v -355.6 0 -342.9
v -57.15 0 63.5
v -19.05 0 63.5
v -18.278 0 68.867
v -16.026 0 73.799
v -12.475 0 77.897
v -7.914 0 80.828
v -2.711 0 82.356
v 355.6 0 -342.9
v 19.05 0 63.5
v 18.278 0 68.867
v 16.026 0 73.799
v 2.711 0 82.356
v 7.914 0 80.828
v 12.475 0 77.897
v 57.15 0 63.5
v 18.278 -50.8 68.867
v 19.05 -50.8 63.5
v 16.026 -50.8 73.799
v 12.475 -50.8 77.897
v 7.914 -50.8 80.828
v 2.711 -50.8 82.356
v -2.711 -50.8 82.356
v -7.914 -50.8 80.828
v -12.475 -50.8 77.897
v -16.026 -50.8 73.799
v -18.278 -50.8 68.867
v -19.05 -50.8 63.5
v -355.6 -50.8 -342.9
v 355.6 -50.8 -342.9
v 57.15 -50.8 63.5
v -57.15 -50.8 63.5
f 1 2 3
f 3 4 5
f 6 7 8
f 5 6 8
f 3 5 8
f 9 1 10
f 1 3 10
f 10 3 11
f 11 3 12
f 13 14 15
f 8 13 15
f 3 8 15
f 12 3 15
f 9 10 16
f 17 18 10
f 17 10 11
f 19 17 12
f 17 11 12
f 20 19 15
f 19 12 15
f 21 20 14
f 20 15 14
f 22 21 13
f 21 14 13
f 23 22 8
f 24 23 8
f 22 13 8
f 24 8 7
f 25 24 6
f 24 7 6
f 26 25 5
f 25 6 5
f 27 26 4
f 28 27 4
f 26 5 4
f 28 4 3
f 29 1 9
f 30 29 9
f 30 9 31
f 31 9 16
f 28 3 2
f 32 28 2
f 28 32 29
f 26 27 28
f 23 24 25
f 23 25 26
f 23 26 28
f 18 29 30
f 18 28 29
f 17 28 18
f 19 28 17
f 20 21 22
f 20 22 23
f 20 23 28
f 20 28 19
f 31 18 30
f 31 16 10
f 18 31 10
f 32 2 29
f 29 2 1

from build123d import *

# Parameters (mm, degrees)
F1_DEPTH = 50.8


with BuildPart() as f1:
    # F0 (on Front) → F1 (new body)
    with BuildSketch(Plane.XZ):
        with BuildLine():
            Line((19.05, 63.5000025991), (0, 63.5000025991))
            Line((0, 63.5000025991), (-19.05, 63.5000025991))
            ThreePointArc((-19.05, 63.5000025991), (0, 44.4500025991), (19.05, 63.5000025991))
        make_face()
        with BuildLine():
            Line((-19.05, 63.5000025991), (0, 63.5000025991))
            Line((0, 63.5000025991), (19.05, 63.5000025991))
            ThreePointArc((19.05, 63.5000025991), (0, 82.5500025991), (-19.05, 63.5000025991))
        make_face()
        with BuildLine():
            ThreePointArc((19.05, 63.5000025991), (0, 44.4500025991), (-19.05, 63.5000025991))
            Line((-19.05, 63.5000025991), (-57.15, 63.5000025991))
            Line((-57.15, 63.5000025991), (-355.6, -342.8999974009))
            Line((-355.6, -342.8999974009), (0, -342.8999974009))
            Line((0, -342.8999974009), (57.15, -342.8999974009))
            Line((57.15, -342.8999974009), (57.15, 63.5000025991))
            Line((57.15, 63.5000025991), (19.05, 63.5000025991))
        make_face()
        Polygon((355.6, -342.8999974009), (57.15, 63.5000025991), (57.15, -342.8999974009), align=None)
    extrude(amount=F1_DEPTH)


solid = f1.part
